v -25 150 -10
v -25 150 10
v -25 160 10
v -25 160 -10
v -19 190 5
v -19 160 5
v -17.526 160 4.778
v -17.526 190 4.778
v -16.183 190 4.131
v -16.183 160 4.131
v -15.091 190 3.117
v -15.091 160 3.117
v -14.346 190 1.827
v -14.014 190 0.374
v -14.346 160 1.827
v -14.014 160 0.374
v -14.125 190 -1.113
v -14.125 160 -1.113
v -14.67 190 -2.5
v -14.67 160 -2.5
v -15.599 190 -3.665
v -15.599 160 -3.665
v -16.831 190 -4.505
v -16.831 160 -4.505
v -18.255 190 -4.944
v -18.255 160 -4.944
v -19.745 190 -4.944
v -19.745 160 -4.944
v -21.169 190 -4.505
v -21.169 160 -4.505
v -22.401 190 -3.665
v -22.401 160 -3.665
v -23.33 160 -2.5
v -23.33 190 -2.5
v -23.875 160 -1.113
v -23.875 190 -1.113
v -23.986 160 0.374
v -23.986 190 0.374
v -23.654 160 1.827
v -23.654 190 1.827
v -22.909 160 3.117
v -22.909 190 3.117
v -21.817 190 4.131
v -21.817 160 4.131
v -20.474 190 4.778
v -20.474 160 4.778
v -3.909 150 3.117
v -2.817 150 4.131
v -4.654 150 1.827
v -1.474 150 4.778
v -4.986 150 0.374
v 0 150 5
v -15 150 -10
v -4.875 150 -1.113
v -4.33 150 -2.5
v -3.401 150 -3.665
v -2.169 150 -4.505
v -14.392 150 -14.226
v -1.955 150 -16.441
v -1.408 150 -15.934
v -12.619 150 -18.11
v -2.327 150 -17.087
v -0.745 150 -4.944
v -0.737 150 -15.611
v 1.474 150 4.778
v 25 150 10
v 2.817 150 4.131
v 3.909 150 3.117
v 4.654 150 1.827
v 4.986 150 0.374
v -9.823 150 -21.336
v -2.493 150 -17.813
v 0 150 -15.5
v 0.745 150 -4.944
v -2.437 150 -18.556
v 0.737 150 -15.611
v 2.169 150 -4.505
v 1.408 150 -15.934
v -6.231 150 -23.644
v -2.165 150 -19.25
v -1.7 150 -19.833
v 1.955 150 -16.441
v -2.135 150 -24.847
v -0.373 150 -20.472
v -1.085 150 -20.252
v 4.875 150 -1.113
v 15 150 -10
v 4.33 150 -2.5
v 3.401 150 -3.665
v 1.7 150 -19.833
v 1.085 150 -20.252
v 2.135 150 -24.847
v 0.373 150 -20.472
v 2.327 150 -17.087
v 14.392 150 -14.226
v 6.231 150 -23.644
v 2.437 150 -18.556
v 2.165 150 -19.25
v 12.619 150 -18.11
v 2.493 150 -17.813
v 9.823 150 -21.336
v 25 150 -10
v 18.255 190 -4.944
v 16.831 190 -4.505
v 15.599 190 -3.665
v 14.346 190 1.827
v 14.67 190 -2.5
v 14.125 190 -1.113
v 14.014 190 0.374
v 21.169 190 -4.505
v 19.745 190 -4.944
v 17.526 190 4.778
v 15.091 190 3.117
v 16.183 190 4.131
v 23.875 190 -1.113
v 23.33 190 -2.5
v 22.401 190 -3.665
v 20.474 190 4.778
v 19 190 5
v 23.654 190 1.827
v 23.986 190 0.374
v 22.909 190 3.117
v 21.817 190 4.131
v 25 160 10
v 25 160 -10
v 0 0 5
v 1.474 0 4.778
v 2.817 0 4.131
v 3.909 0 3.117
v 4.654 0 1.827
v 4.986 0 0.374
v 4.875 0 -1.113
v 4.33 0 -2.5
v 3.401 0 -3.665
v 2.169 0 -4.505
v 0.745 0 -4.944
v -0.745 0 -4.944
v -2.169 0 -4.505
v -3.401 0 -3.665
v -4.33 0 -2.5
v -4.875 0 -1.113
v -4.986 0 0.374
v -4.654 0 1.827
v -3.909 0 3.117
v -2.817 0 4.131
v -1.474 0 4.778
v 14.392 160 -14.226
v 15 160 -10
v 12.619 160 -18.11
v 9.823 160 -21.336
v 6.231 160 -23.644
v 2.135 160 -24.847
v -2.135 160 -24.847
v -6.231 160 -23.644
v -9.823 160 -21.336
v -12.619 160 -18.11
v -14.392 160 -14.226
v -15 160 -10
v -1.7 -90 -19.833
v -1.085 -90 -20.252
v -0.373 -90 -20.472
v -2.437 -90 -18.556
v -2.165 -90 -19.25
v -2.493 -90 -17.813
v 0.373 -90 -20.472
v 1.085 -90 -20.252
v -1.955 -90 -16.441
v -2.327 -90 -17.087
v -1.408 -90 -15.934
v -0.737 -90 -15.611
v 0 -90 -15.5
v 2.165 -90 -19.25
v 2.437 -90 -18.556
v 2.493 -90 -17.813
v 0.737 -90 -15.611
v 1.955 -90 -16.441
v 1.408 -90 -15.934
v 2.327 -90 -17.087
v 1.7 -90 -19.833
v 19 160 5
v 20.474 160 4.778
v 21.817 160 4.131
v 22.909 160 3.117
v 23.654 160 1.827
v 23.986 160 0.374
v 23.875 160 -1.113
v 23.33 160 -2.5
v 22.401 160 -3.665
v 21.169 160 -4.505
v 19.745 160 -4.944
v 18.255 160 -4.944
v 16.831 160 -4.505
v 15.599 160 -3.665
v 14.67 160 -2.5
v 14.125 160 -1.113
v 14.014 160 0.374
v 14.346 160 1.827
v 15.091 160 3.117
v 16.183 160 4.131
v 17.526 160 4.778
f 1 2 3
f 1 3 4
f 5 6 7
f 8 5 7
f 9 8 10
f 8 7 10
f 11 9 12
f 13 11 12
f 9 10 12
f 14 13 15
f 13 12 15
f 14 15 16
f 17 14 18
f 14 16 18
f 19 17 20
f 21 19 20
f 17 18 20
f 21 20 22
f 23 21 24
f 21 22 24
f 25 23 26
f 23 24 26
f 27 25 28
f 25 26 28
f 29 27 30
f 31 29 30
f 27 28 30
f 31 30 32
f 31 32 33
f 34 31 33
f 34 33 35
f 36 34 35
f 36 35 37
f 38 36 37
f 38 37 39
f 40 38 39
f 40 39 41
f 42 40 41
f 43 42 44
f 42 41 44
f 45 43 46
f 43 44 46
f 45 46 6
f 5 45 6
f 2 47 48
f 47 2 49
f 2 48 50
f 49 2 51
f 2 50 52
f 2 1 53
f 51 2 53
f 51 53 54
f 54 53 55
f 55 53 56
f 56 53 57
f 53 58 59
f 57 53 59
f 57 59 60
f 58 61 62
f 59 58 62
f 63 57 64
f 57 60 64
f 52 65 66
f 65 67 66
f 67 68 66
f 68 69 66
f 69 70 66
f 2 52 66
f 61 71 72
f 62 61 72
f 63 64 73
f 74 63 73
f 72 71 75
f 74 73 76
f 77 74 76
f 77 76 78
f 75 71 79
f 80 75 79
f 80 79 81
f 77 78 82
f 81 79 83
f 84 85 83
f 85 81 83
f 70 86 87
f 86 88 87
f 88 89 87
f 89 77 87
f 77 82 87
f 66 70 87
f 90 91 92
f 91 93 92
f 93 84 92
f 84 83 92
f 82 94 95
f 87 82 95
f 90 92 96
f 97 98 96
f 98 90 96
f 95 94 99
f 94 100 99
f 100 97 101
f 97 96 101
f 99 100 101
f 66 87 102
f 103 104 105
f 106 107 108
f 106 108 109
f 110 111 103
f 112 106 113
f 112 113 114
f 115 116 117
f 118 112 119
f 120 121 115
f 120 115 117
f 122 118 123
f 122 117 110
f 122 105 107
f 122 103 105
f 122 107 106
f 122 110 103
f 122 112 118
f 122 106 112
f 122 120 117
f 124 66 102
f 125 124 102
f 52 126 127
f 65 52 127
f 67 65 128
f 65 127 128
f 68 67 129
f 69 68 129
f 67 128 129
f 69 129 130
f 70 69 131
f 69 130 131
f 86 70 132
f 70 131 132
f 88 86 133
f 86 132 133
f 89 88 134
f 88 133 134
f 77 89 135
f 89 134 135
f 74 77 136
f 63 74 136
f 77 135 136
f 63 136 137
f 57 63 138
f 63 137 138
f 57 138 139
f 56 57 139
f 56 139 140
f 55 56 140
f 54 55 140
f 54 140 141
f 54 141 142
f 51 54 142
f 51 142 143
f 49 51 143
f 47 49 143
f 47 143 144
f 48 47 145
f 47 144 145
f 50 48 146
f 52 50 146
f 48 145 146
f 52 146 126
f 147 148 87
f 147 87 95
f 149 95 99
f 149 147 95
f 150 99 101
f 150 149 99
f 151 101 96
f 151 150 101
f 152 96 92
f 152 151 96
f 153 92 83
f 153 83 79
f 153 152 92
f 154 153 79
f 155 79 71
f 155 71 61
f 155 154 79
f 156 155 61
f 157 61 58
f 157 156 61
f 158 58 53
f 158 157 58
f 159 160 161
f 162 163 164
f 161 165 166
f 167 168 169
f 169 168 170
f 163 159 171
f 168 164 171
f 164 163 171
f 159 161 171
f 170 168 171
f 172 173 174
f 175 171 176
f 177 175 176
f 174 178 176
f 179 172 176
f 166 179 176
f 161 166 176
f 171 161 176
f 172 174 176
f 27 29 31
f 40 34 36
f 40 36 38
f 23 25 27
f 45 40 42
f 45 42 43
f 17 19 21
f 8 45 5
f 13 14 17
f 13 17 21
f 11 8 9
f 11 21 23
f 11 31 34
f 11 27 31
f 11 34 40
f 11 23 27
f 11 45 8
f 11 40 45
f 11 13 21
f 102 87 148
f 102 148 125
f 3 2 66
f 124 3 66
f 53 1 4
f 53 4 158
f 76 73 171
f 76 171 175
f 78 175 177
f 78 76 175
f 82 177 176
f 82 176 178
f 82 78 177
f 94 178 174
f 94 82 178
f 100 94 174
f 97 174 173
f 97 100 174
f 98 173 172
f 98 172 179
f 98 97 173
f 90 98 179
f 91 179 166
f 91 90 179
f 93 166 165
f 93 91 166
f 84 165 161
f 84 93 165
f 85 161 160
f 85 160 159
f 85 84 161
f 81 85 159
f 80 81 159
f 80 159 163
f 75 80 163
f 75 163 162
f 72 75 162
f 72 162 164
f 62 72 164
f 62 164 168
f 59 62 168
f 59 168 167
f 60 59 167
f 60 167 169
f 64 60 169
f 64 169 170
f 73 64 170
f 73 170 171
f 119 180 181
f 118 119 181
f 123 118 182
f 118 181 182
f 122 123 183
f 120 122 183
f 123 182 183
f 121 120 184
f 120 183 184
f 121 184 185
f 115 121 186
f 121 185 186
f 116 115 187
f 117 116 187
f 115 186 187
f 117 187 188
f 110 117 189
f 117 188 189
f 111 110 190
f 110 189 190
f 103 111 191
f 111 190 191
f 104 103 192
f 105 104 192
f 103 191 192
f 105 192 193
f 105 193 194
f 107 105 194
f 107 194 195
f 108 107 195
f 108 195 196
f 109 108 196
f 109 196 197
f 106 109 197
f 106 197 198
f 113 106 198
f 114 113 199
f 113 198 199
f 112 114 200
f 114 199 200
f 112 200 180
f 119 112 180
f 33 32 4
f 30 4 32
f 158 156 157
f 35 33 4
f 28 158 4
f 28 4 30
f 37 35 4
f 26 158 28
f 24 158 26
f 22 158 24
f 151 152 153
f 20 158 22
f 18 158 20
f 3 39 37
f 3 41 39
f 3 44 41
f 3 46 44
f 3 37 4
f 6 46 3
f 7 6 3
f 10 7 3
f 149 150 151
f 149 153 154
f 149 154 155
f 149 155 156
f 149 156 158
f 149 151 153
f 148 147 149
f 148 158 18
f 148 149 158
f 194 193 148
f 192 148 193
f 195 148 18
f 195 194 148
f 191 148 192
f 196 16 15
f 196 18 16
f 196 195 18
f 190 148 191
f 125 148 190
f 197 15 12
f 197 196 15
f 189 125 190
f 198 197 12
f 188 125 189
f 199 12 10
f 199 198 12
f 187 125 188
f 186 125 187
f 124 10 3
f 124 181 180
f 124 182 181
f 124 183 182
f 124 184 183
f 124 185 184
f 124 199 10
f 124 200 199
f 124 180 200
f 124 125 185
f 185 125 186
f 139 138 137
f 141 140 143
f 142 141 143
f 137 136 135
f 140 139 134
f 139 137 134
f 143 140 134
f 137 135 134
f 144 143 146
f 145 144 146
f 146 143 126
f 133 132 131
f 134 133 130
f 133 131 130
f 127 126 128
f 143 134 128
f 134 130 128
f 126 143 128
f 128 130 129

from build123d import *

# Parameters (mm, degrees)
SKETCH1_R           = 5
BOSS_EXTRUDE1_DEPTH = 150
SKETCH2_W           = 50
SKETCH2_H           = 20
BOSS_EXTRUDE2_DEPTH = 10
SKETCH3_R           = 5
BOSS_EXTRUDE3_DEPTH = 30
BOSS_EXTRUDE4_DEPTH = 10
SKETCH5_R           = 2.5
BOSS_EXTRUDE5_DEPTH = 250


with BuildPart() as part:
    # Sketch1 → Boss-Extrude1 (new body)
    with BuildSketch(Plane(origin=(0, 0, 0), x_dir=(1, 0, 0), z_dir=(0, 1, 0))):
        with Locations(Location((0, 0, 0), (0, 0, 270))):
            Circle(SKETCH1_R)
    extrude(amount=BOSS_EXTRUDE1_DEPTH)

    # Sketch2 → Boss-Extrude2 (add)
    with BuildSketch(Plane(origin=(0, 150, 0), x_dir=(1, 0, 0), z_dir=(0, 1, 0))):
        Rectangle(SKETCH2_W, SKETCH2_H)
    extrude(amount=BOSS_EXTRUDE2_DEPTH)

    # Sketch3 → Boss-Extrude3 (add)
    with BuildSketch(Plane(origin=(0, 160, 0), x_dir=(1, 0, 0), z_dir=(0, 1, 0))):
        with Locations(Location((-19, 0, 0), (0, 0, 270))):
            Circle(SKETCH3_R)
        with Locations(Location((19, 0, 0), (0, 0, 270))):
            Circle(SKETCH3_R)
    extrude(amount=BOSS_EXTRUDE3_DEPTH)

    # Sketch4 → Boss-Extrude4 (add)
    with BuildSketch(Plane(origin=(0, 160, 0), x_dir=(1, 0, 0), z_dir=(0, 1, 0))):
        with BuildLine():
            Line((-15, 10), (15, 10))
            ThreePointArc((15, 10), (0, 25), (-15, 10))
        make_face()
    extrude(amount=-BOSS_EXTRUDE4_DEPTH)

    # Sketch5 → Boss-Extrude5 (add)
    with BuildSketch(Plane(origin=(0, 160, 0), x_dir=(1, 0, 0), z_dir=(0, 1, 0))):
        with Locations(Location((0, 18, 0), (0, 0, 270))):
            Circle(SKETCH5_R)
    extrude(amount=-BOSS_EXTRUDE5_DEPTH)


solid = part.part
